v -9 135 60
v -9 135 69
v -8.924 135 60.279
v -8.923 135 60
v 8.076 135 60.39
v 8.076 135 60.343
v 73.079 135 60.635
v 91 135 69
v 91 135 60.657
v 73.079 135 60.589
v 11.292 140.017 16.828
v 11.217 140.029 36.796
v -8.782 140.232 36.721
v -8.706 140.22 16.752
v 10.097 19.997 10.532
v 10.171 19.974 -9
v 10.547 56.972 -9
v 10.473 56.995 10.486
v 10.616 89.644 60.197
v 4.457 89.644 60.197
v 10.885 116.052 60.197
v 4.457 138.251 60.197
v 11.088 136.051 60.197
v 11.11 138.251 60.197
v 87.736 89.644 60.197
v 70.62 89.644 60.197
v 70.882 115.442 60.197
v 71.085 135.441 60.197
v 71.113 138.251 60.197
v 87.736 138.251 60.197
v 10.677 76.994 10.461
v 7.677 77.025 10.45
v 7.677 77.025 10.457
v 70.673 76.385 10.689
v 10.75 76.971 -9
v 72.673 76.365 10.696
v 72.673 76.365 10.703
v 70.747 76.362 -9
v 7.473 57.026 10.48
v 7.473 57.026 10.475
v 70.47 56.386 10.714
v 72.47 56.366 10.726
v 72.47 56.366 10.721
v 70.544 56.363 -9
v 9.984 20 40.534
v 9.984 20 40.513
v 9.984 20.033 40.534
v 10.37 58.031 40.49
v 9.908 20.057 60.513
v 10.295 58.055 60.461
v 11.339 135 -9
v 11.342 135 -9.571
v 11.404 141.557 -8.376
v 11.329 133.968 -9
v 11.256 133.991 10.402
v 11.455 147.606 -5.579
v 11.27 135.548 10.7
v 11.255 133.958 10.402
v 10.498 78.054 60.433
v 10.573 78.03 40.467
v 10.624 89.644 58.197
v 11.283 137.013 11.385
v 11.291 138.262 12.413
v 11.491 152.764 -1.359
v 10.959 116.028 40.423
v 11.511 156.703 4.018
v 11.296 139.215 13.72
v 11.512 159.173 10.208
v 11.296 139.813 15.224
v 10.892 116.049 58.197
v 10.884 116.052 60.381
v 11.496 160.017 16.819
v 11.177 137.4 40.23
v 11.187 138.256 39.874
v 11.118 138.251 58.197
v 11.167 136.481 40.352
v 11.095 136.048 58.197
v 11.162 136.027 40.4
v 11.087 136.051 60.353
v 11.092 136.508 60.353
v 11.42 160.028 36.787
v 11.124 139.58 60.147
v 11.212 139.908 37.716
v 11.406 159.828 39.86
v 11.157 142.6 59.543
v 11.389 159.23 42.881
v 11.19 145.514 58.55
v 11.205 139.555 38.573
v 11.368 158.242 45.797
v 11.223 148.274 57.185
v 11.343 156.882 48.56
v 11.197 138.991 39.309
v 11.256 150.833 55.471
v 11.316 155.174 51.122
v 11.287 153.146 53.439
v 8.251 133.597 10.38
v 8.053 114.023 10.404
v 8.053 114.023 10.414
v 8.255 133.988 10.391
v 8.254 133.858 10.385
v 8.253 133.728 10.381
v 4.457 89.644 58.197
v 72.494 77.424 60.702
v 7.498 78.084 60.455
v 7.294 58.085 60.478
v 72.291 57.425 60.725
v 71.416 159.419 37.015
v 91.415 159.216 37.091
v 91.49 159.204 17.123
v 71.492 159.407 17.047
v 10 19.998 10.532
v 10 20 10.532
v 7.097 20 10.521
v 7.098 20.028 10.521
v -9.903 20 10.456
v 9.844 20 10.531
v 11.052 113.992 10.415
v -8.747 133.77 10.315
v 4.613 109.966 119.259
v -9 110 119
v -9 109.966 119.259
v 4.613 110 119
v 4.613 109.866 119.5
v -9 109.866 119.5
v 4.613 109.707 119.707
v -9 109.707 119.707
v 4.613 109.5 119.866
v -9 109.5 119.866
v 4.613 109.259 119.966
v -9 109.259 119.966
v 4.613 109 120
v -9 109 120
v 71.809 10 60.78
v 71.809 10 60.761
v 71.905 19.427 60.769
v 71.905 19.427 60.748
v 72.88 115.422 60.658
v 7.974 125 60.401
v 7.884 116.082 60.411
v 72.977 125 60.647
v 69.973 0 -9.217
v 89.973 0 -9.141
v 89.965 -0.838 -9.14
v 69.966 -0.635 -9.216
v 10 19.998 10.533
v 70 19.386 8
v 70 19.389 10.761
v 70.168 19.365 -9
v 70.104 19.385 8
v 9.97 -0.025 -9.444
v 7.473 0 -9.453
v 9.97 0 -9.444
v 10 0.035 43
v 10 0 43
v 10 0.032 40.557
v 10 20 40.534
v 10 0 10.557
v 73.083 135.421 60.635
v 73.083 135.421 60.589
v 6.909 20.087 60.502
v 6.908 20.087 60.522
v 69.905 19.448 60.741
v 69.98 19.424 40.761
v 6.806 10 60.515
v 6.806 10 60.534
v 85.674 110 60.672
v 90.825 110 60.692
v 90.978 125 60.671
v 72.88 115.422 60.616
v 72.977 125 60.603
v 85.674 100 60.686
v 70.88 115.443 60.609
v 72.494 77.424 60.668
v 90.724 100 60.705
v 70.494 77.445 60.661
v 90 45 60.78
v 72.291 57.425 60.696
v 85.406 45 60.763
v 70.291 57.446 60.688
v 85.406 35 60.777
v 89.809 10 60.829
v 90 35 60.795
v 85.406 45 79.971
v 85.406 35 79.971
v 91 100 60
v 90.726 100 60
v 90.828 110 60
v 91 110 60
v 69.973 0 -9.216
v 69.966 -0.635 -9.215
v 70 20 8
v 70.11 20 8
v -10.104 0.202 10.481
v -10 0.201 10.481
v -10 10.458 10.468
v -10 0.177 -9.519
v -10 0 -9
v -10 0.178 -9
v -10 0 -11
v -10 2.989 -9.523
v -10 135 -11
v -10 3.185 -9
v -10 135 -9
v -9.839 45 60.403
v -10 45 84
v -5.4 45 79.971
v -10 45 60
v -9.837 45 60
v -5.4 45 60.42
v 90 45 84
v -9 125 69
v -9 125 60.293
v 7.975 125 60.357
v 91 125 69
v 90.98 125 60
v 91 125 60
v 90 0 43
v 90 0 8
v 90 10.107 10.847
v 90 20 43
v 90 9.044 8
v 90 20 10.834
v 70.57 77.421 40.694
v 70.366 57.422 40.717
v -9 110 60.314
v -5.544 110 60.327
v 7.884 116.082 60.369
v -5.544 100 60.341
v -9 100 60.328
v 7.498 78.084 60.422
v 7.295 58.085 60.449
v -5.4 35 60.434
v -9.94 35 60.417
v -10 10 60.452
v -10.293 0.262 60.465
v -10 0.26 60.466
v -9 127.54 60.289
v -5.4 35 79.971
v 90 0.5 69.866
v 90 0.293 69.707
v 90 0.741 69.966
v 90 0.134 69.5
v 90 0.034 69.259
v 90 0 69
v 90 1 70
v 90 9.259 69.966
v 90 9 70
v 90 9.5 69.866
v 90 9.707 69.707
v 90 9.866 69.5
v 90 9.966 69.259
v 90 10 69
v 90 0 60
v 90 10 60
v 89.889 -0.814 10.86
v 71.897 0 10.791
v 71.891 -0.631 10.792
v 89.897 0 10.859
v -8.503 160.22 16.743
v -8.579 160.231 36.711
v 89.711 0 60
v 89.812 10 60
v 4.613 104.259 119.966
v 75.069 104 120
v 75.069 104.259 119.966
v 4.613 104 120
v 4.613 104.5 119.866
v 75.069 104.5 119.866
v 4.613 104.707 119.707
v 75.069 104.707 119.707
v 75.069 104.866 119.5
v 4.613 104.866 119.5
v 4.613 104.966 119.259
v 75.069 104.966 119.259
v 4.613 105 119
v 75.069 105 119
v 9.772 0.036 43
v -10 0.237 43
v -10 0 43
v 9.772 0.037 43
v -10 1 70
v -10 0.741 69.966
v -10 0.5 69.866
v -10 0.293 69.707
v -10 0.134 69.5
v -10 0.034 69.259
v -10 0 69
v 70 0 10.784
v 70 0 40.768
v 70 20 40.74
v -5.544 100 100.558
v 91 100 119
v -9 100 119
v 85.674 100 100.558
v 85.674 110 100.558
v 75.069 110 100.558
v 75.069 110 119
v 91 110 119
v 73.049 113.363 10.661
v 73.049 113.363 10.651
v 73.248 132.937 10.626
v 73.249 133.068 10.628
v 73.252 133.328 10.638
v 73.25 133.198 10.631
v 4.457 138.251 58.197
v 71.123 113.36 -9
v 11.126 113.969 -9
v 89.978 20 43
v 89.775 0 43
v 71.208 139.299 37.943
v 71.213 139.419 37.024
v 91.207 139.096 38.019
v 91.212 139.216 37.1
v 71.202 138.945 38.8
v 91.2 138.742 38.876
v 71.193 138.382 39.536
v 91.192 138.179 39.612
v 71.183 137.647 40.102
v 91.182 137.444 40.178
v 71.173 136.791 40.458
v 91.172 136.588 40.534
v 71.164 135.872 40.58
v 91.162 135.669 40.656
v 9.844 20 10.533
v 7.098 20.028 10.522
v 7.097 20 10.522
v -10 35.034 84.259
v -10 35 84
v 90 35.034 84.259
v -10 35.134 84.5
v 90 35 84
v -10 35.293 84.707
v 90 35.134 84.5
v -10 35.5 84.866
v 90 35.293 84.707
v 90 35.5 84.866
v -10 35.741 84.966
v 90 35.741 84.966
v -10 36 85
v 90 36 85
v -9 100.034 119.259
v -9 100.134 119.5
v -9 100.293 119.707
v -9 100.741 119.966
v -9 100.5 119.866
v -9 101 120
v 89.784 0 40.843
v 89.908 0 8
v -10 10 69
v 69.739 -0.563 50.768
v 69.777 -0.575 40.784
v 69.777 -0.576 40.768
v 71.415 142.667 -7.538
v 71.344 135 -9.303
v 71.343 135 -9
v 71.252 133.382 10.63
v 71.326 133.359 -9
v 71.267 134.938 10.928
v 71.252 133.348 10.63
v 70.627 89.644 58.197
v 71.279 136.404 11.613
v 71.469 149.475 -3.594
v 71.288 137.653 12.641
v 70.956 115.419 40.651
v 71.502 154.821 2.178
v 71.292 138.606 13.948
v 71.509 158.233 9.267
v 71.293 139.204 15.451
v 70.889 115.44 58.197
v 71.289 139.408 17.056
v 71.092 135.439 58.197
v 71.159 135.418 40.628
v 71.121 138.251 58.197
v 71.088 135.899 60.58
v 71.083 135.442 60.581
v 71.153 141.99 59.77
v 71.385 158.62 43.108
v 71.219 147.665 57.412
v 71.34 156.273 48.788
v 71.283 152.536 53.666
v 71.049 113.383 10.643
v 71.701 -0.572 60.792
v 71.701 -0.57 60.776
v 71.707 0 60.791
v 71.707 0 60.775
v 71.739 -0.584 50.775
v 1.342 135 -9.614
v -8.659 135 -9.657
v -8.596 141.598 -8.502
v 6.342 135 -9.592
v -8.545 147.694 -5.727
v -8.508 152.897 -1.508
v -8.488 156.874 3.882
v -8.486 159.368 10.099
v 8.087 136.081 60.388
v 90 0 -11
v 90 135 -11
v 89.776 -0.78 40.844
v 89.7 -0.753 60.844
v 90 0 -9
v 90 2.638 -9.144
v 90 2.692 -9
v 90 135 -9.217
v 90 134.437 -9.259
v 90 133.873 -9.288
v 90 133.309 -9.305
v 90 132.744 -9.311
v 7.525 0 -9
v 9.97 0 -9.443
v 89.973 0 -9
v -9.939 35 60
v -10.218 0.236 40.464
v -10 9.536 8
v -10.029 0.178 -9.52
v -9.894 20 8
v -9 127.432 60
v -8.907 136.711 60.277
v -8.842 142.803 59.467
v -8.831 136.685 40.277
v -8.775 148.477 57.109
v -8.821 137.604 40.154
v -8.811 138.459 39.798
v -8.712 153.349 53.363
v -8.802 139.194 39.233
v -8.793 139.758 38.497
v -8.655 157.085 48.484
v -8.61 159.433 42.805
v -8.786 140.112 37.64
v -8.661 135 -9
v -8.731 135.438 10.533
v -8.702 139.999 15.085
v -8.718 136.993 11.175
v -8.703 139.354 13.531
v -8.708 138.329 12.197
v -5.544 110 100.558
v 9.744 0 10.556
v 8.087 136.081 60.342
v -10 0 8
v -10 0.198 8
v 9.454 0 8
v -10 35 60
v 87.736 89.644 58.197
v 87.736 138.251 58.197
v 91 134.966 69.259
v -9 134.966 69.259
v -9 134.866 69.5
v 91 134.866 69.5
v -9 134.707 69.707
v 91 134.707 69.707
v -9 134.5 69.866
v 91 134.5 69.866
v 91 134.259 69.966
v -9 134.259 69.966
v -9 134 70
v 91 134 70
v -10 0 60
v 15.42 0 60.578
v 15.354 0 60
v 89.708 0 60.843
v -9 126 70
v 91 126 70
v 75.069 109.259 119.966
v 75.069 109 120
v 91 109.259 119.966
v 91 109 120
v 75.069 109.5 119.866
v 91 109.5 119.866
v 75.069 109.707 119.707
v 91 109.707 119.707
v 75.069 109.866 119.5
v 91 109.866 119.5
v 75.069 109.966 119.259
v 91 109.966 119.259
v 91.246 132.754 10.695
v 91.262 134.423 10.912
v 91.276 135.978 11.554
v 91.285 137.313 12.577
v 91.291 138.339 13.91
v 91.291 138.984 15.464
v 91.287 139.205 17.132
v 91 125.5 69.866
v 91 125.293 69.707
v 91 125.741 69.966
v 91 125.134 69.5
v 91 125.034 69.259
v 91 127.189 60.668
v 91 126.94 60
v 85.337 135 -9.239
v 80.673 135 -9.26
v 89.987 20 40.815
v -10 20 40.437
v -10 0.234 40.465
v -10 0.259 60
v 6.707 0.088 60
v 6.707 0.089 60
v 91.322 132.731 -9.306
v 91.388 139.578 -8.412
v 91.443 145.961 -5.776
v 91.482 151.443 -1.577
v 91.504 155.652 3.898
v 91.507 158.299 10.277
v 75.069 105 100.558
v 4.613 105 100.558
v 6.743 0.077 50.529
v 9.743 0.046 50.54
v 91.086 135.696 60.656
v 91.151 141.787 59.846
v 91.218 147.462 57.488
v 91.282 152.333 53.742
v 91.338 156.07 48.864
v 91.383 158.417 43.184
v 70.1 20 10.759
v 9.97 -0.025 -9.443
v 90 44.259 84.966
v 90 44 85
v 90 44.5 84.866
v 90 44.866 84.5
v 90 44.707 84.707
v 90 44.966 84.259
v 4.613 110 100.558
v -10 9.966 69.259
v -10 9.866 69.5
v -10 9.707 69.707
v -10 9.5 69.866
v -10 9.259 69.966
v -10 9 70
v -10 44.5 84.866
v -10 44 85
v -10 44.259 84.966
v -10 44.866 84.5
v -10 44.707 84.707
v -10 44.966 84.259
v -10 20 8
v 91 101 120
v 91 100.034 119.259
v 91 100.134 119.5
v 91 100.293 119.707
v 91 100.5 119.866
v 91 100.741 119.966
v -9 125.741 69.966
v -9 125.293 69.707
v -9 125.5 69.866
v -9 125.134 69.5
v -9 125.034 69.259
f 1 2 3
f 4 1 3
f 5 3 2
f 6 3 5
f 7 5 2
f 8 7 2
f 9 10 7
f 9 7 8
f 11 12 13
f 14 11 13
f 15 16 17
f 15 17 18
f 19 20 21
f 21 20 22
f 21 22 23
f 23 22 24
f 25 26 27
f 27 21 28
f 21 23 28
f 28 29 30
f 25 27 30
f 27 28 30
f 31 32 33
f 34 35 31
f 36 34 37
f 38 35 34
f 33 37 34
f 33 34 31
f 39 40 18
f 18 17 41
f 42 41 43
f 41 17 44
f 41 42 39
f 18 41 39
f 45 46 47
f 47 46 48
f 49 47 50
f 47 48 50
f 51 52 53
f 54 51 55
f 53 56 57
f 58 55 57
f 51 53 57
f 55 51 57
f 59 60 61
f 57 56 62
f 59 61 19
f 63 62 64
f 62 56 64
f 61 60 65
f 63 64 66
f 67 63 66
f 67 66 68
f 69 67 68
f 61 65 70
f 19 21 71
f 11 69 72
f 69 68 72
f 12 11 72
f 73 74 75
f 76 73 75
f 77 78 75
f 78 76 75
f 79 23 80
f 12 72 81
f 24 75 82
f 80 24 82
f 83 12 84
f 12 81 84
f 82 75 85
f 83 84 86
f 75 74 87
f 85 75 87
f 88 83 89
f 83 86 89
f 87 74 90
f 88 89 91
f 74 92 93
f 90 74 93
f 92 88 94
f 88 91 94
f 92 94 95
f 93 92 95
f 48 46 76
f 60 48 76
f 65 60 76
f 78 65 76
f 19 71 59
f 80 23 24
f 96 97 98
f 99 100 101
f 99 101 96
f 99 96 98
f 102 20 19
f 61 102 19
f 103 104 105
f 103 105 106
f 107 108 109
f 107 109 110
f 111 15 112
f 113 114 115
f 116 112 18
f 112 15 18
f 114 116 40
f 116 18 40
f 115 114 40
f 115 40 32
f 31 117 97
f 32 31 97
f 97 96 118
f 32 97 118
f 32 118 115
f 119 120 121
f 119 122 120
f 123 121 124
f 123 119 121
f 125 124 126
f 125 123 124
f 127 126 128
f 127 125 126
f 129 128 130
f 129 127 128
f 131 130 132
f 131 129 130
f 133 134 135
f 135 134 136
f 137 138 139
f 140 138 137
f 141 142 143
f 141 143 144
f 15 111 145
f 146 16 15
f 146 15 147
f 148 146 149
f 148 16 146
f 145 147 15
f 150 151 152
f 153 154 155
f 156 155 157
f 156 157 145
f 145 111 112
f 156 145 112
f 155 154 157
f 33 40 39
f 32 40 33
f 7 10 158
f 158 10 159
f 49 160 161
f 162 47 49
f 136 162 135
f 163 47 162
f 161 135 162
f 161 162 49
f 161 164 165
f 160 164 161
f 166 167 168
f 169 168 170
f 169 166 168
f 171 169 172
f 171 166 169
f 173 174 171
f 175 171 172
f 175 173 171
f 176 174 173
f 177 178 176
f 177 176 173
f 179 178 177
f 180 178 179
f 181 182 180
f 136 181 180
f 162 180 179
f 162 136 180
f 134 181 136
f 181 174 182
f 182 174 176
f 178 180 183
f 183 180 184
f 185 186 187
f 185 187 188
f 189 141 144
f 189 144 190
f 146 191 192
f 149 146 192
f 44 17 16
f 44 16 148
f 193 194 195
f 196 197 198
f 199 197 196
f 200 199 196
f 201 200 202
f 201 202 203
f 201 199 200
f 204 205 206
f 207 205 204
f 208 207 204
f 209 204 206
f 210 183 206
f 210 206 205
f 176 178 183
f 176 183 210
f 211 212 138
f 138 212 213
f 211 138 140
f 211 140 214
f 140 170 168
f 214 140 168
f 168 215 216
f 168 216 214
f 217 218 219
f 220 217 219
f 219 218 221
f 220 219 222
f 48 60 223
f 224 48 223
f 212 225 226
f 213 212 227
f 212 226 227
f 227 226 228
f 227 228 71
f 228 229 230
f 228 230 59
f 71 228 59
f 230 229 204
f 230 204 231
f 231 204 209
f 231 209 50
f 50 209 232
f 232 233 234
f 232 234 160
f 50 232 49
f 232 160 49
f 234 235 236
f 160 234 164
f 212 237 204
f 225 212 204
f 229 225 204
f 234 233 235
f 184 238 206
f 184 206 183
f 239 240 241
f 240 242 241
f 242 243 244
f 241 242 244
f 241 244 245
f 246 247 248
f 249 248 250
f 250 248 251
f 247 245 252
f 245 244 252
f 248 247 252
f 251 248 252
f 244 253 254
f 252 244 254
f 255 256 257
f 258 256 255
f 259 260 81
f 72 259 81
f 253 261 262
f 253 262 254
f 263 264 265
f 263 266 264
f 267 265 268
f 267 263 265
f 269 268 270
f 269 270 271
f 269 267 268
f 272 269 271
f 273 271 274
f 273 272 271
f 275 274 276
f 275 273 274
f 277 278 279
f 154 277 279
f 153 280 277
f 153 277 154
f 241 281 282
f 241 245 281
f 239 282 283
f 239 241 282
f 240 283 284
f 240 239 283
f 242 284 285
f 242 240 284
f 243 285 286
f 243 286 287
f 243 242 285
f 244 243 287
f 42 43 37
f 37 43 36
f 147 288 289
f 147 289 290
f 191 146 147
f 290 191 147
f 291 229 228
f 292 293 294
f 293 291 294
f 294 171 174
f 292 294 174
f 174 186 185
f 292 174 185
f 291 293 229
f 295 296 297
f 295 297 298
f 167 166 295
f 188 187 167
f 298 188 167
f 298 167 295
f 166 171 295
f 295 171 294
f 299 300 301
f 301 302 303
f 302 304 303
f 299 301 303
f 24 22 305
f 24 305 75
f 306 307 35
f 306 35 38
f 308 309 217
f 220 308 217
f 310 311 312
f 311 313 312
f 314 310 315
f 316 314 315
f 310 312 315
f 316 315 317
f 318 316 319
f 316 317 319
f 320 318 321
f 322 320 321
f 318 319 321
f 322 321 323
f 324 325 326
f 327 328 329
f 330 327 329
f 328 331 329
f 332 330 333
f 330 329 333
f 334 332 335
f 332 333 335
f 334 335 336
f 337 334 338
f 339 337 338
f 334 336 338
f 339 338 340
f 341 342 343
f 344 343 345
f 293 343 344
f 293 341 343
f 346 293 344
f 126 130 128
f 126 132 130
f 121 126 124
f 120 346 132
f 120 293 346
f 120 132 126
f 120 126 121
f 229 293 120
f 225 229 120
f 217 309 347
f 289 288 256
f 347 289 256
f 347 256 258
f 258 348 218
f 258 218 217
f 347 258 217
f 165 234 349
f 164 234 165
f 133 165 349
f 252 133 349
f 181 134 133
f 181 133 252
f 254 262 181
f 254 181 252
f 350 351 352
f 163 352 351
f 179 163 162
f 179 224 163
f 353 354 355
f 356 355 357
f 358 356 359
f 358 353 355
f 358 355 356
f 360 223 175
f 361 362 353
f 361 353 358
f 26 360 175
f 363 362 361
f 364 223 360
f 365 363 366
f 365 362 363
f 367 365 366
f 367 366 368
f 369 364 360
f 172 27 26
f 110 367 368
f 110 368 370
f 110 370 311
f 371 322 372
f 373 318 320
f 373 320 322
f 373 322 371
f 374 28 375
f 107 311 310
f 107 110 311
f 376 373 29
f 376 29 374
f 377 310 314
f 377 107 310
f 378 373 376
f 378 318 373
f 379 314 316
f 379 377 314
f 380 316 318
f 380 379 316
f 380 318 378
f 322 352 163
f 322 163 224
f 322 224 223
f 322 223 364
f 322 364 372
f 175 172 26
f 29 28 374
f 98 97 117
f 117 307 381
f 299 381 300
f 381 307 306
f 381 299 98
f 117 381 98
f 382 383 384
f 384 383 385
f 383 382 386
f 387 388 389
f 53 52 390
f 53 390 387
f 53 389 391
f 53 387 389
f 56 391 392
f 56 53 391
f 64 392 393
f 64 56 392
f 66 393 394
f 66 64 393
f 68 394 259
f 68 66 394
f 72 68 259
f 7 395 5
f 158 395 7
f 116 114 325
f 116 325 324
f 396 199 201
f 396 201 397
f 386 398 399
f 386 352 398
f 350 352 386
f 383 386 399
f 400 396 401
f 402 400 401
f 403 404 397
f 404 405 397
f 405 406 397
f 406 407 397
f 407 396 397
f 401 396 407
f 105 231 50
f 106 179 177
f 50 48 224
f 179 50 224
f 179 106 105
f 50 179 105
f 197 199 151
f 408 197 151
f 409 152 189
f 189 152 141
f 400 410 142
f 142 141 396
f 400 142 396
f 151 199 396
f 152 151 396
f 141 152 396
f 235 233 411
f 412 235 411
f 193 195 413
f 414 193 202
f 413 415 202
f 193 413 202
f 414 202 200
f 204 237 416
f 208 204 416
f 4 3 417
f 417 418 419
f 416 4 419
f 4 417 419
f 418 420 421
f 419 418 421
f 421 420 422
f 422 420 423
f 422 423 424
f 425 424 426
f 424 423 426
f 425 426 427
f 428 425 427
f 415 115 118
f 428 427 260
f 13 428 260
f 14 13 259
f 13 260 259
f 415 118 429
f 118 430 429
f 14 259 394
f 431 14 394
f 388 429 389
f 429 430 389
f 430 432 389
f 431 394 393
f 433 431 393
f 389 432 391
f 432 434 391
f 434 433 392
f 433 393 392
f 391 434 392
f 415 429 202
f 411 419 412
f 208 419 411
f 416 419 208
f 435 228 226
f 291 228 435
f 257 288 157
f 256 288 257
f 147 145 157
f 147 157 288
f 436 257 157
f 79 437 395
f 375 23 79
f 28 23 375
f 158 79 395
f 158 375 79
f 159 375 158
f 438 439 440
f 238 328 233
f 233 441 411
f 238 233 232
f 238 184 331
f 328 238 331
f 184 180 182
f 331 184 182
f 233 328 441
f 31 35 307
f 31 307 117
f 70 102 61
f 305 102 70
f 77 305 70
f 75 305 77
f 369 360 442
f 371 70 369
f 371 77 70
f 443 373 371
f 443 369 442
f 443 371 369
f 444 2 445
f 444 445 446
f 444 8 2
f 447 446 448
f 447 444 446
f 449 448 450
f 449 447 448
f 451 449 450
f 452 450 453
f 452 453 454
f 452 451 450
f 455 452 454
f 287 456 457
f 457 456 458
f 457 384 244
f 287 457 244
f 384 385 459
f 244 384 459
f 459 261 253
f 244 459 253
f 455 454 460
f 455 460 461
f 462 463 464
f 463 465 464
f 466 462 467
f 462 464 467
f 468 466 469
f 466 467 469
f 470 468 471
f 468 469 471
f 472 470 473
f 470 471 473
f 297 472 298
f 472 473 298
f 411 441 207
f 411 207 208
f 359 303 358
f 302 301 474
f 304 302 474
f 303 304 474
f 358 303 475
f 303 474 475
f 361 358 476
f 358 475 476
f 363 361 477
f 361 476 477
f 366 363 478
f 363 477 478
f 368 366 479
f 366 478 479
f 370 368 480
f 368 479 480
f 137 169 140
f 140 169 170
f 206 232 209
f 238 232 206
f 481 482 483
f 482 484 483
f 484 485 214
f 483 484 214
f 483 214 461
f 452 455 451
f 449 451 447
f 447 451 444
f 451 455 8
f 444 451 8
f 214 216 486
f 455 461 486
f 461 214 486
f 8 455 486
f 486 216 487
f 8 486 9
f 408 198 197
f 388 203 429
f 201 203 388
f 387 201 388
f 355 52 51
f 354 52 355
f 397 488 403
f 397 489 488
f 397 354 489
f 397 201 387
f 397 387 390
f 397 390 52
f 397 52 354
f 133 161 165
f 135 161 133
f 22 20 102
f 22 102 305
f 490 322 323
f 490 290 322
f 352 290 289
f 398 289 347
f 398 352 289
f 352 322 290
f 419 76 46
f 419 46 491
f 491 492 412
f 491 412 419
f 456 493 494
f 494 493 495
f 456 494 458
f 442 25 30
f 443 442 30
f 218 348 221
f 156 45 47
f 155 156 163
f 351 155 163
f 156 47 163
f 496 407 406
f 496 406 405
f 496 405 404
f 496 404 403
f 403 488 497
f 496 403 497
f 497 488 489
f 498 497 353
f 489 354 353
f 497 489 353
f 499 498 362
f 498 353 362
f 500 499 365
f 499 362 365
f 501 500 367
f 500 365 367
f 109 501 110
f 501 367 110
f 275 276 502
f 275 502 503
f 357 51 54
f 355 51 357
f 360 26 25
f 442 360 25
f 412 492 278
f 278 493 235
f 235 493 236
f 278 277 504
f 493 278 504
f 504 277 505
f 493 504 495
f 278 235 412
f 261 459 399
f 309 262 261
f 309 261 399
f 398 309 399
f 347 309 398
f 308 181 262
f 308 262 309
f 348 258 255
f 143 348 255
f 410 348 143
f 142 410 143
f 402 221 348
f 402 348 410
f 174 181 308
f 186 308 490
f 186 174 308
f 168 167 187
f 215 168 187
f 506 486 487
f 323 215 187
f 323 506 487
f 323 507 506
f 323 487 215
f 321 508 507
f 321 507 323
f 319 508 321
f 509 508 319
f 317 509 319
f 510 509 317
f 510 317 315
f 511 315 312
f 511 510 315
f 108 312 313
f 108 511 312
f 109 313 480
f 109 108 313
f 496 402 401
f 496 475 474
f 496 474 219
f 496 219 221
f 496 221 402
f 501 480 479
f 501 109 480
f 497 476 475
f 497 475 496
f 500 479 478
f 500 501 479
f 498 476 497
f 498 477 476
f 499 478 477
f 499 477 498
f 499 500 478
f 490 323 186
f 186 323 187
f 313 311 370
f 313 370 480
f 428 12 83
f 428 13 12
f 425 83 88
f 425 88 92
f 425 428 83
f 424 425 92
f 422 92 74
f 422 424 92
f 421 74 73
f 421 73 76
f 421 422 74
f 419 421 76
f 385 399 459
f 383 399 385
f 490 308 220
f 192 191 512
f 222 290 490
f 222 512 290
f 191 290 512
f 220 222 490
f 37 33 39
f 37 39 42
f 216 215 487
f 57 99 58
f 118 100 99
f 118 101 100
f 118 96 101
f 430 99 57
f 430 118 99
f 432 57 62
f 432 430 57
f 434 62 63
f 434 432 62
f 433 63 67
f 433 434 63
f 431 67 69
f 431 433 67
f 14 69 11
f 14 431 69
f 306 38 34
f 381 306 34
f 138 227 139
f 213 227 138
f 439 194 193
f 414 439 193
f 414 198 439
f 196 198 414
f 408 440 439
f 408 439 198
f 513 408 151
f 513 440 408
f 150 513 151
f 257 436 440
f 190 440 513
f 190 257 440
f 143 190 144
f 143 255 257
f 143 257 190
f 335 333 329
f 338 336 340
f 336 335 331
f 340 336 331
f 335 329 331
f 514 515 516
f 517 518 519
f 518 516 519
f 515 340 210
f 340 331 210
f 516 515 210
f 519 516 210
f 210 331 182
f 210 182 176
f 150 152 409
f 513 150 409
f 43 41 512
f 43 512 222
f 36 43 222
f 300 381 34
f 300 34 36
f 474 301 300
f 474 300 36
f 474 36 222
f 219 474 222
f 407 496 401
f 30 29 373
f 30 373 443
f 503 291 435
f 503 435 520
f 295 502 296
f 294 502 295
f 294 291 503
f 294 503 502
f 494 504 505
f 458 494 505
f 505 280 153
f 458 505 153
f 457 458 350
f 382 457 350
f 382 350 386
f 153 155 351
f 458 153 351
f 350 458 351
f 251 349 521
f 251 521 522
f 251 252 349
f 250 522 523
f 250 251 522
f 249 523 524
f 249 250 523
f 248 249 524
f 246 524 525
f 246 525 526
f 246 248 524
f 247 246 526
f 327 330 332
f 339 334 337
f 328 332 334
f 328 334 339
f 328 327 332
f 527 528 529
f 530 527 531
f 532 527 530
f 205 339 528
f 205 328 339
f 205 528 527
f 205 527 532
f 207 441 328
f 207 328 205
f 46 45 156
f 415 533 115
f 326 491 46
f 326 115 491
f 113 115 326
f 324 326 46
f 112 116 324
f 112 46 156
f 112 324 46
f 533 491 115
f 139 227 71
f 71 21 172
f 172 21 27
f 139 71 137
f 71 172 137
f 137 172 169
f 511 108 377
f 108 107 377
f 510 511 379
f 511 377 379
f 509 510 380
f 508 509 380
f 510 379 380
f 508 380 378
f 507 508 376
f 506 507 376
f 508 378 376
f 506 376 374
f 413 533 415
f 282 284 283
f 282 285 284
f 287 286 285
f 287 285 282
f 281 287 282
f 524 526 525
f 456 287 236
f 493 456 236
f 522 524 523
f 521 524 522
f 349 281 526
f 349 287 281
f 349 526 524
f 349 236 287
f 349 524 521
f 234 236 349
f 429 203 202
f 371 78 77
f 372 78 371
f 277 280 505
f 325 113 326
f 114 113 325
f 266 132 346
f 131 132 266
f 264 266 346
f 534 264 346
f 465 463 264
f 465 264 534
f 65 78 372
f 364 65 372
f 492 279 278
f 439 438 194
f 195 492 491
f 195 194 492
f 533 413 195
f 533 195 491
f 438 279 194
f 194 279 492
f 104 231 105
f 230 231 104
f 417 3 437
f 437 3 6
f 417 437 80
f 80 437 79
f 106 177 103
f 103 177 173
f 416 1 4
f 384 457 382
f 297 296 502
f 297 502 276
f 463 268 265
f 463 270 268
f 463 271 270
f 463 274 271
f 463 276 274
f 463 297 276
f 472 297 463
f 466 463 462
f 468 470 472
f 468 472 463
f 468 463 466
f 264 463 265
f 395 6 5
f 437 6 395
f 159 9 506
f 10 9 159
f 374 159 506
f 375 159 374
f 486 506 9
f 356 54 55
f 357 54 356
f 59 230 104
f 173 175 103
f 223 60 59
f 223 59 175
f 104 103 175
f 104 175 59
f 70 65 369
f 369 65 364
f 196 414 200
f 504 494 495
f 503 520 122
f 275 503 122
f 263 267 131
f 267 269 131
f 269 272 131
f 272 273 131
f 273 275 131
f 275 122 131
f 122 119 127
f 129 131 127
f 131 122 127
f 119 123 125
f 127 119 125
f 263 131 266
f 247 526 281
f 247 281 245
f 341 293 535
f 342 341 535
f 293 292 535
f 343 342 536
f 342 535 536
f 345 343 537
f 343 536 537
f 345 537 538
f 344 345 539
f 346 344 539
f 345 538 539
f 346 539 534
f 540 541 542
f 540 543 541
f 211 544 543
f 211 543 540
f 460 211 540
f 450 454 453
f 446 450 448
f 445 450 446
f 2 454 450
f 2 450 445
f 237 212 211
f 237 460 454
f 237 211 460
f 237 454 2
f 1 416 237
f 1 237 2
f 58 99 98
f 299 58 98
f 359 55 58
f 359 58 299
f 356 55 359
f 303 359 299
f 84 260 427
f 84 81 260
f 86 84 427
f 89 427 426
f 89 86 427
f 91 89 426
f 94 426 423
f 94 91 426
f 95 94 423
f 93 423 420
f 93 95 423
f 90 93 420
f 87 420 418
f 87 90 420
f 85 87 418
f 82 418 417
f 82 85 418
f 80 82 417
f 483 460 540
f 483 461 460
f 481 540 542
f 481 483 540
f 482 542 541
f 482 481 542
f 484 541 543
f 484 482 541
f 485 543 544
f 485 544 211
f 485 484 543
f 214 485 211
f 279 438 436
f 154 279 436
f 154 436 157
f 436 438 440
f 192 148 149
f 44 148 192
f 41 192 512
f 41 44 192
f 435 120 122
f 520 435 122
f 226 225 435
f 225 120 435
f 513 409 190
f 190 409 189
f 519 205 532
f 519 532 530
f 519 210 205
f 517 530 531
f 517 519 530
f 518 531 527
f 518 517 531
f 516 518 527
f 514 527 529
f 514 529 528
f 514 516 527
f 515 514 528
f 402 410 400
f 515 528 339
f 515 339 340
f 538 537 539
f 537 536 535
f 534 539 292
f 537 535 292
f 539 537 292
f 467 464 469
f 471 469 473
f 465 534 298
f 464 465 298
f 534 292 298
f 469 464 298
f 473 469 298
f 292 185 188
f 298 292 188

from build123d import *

# Parameters (mm, degrees)
BOX003_W                  = 100
BOX003_H                  = 10
BOX003_DEPTH              = 25
SKETCH003_W               = 90.806315
SKETCH003_H               = 20.169361
POCKET_DEPTH              = 10.001
BOX005_W                  = 100
BOX005_H                  = 10
BOX005_DEPTH              = 60
SKETCH004_W               = 91.218086
SKETCH004_H               = 40.361668
POCKET001_DEPTH           = 10.001
SKETCH005_W               = 70.455691
SKETCH005_H               = 22.66835
POCKET002_DEPTH           = 5
BOX004_W                  = 100
BOX004_H                  = 10
BOX004_DEPTH              = 10
BOX001_W                  = 65
BOX001_H                  = 20
BOX001_DEPTH              = 20
ARRAY001_Y_COUNT          = 3
ARRAY001_Y_PITCH          = 58
BOX_W                     = 65
BOX_H                     = 20
BOX_DEPTH                 = 20
ARRAY_Y_COUNT             = 3
ARRAY_Y_PITCH             = 57
SKETCH_W                  = 19.999652
SKETCH_H                  = 20.000471
FUSION002_ROLL_ANGLE      = -0.066054
FUSION002_PITCH_ANGLE     = -0.217392
FUSION002_PLACEMENT_ANGLE = -0.581856
BOX002_W                  = 100
BOX002_H                  = 10
BOX002_DEPTH              = 10
BOX006_W                  = 20
BOX006_H                  = 20
BOX006_DEPTH              = 35
ARRAY002_X_COUNT          = 2
ARRAY002_X_PITCH          = 80
BOX007_W                  = 100
BOX007_H                  = 135
BOX007_DEPTH              = 2
FILLET008_R               = 1
FILLET009_R               = 1
SKETCH006_W               = 83.27878
SKETCH006_H               = 48.60762
POCKET003_DEPTH           = 2


with BuildPart() as pocket:
    # Box003 → Box003 (new body)
    with BuildSketch(Plane(origin=(-10, 35, 60), x_dir=(1, 0, 0), z_dir=(0, 0, 1))):
        with Locations((50, 5)):
            Rectangle(BOX003_W, BOX003_H)
    extrude(amount=BOX003_DEPTH)

    # Sketch003 → Pocket (cut, through all)
    with BuildSketch(Plane(origin=(-10, 35, 60), x_dir=(1, 0, 0), z_dir=(0, -1, 0))):
        with Locations((50.00284, 9.885892)):
            Rectangle(SKETCH003_W, SKETCH003_H)
    extrude(amount=-POCKET_DEPTH, mode=Mode.SUBTRACT)


with BuildPart() as pocket002:
    # Box005 → Box005 (new body)
    with BuildSketch(Plane(origin=(-9, 100, 60), x_dir=(1, 0, 0), z_dir=(0, 0, 1))):
        with Locations((50, 5)):
            Rectangle(BOX005_W, BOX005_H)
    extrude(amount=BOX005_DEPTH)

    # Sketch004 → Pocket001 (cut, through all)
    with BuildSketch(Plane(origin=(-9, 100, 60), x_dir=(1, 0, 0), z_dir=(0, -1, 0))):
        with Locations((49.065182, 20.377592)):
            Rectangle(SKETCH004_W, SKETCH004_H)
    extrude(amount=-POCKET001_DEPTH, mode=Mode.SUBTRACT)

    # Sketch005 → Pocket002 (cut)
    with BuildSketch(Plane(origin=(-9, 110, 60), x_dir=(-1, 0, 0), z_dir=(0, 1, 0))):
        with Locations((-48.841116, 49.679405)):
            Rectangle(SKETCH005_W, SKETCH005_H)
    extrude(amount=-POCKET002_DEPTH, mode=Mode.SUBTRACT)


with BuildPart() as bertikalki_eusteko_oin_txikia:
    # Box004 → Box004 (new body)
    with BuildSketch(Plane(origin=(-9, 125, 60), x_dir=(1, 0, 0), z_dir=(0, 0, 1))):
        with Locations((50, 5)):
            Rectangle(BOX004_W, BOX004_H)
    extrude(amount=BOX004_DEPTH)


with BuildPart() as goiko_oloturak:
    # Box001 → Box001 (new body)
    with BuildSketch(Plane(origin=(7, 0, 40), x_dir=(1, 0, 0), z_dir=(0, 0, 1))):
        with Locations((32.5, 10)):
            Rectangle(BOX001_W, BOX001_H)
    extrude(amount=BOX001_DEPTH)

    # Array001 Y: Goiko oloturak ×3


with BuildPart() as goiko_oloturak_1:
    add(goiko_oloturak.part)
    with Locations(*[(0, i * ARRAY001_Y_PITCH, 0) for i in range(1, ARRAY001_Y_COUNT)]):
        add(goiko_oloturak.part)


with BuildPart() as beherako_loturak:
    # Box → Box (new body)
    with BuildSketch(Plane(origin=(7, 0, -10), x_dir=(1, 0, 0), z_dir=(0, 0, 1))):
        with Locations((32.5, 10)):
            Rectangle(BOX_W, BOX_H)
    extrude(amount=BOX_DEPTH)

    # Array Y: Beherako loturak ×3


with BuildPart() as beherako_loturak_1:
    add(beherako_loturak.part)
    with Locations(*[(0, i * ARRAY_Y_PITCH, 0) for i in range(1, ARRAY_Y_COUNT)]):
        add(beherako_loturak.part)


with BuildPart() as oinarrizko_estruktura:
    # Sweep: sweep along a path in Sketch001
    with BuildLine(Plane.YZ) as sweep_path:
        Line((0, 0), (133.575411, -0.011573))
        ThreePointArc((133.575411, -0.011573), (145.205679, 4.807053), (150.018155, 16.439868))
        Line((150.018155, 16.439868), (150.005868, 36.408139))
        ThreePointArc((150.005868, 36.408139), (146.034392, 45.985141), (136.455834, 49.952864))
        Line((136.455834, 49.952864), (0, 49.98336))
    # Sketch → Sweep (sweep)
    with BuildSketch(Plane.XZ):
        with Locations((0.000263, -0.000434)):
            Rectangle(SKETCH_W, SKETCH_H)
    sweep(path=sweep_path.line)


with BuildPart() as estruktura_loturak:
    # Fusion base: copy of Oinarrizko estruktura
    add(oinarrizko_estruktura.part)

    # Fusion: union Beherako loturak
    add(beherako_loturak_1.part)


with BuildPart() as estruktura:
    # Part__Mirroring: instance of Oinarrizko estruktura
    add(oinarrizko_estruktura.part.mirror(Plane(origin=(0, 0, 0), x_dir=(0, -1, 0), z_dir=(1, 0, 0))))


with BuildPart() as estruktura_1:
    # Part__Mirroring placement: moved
    add(estruktura.part.moved(Location((80, 0, 0))))

    # Fusion001: union Estruktura + loturak
    add(estruktura_loturak.part)

    # Fusion002: union Goiko oloturak
    add(goiko_oloturak_1.part)


with BuildPart() as estruktura_2:
    # Fusion002 roll: moved
    add(estruktura_1.part.rotate(Axis((0, 0, 0), (1, 0, 0)), FUSION002_ROLL_ANGLE))


with BuildPart() as estruktura_3:
    # Fusion002 pitch: moved
    add(estruktura_2.part.rotate(Axis((0, 0, 0), (0, 1, 0)), FUSION002_PITCH_ANGLE))


with BuildPart() as estruktura_4:
    # Fusion002 placement: moved
    add(estruktura_3.part.moved(Location((-0.067416, 0.088109, 0.519024))).rotate(Axis((-0.067416, 0.088109, 0.519024), (0, 0, 1)), FUSION002_PLACEMENT_ANGLE))


with BuildPart() as estruktura_oin_txikiarekin:
    # Box002 → Box002 (new body)
    with BuildSketch(Plane(origin=(-10, 0, 60), x_dir=(1, 0, 0), z_dir=(0, 0, 1))):
        with Locations((50, 5)):
            Rectangle(BOX002_W, BOX002_H)
    extrude(amount=BOX002_DEPTH)

    # Fusion003: union Estruktura
    add(estruktura_4.part)


with BuildPart() as fusion004:
    # Box006 → Box006 (new body)
    with BuildSketch(Plane(origin=(-10, 0, 8), x_dir=(1, 0, 0), z_dir=(0, 0, 1))):
        with Locations((10, 10)):
            Rectangle(BOX006_W, BOX006_H)
    extrude(amount=BOX006_DEPTH)

    # Array002 X: Fusion004 ×2


with BuildPart() as fusion004_1:
    add(fusion004.part)
    with Locations(*[(i * ARRAY002_X_PITCH, 0, 0) for i in range(1, ARRAY002_X_COUNT)]):
        add(fusion004.part)

    # Fusion004: union Estruktura oin txikiarekin
    add(estruktura_oin_txikiarekin.part)


with BuildPart() as pocket003:
    # Box007 → Box007 (new body)
    with BuildSketch(Plane(origin=(-10, 0, -11), x_dir=(1, 0, 0), z_dir=(0, 0, 1))):
        with Locations((50, 67.5)):
            Rectangle(BOX007_W, BOX007_H)
    extrude(amount=BOX007_DEPTH)

    # Fusion005: union Fusion004
    add(fusion004_1.part)

    # Fusion006: union Pocket, Pocket002, Bertikalki eusteko oin txikia
    add(pocket.part)
    add(pocket002.part)
    add(bertikalki_eusteko_oin_txikia.part)

    # Fillet008
    fillet008_edges = [pocket003.edges().sort_by_distance(p)[0] for p in [
        (41, 135, 70),
        (41, 125, 70),
        (40, 45, 85),
        (40, 35, 85),
    ]]
    fillet(fillet008_edges, radius=FILLET008_R)

    # Fillet009
    fillet009_edges = [pocket003.edges().sort_by_distance(p)[0] for p in [
        (40, 10, 70),
        (-2.193365, 110, 120),
        (41, 100, 120),
        (40, 0, 70),
        (83.034481, 110, 120),
        (39.841116, 105, 120),
    ]]
    fillet(fillet009_edges, radius=FILLET009_R)

    # Sketch006 → Pocket003 (cut)
    with BuildSketch(Plane.XY.offset(60.196758)):
        with Locations((46.096251, 113.947426)):
            Rectangle(SKETCH006_W, SKETCH006_H)
    extrude(amount=-POCKET003_DEPTH, mode=Mode.SUBTRACT)


solid = pocket003.part
